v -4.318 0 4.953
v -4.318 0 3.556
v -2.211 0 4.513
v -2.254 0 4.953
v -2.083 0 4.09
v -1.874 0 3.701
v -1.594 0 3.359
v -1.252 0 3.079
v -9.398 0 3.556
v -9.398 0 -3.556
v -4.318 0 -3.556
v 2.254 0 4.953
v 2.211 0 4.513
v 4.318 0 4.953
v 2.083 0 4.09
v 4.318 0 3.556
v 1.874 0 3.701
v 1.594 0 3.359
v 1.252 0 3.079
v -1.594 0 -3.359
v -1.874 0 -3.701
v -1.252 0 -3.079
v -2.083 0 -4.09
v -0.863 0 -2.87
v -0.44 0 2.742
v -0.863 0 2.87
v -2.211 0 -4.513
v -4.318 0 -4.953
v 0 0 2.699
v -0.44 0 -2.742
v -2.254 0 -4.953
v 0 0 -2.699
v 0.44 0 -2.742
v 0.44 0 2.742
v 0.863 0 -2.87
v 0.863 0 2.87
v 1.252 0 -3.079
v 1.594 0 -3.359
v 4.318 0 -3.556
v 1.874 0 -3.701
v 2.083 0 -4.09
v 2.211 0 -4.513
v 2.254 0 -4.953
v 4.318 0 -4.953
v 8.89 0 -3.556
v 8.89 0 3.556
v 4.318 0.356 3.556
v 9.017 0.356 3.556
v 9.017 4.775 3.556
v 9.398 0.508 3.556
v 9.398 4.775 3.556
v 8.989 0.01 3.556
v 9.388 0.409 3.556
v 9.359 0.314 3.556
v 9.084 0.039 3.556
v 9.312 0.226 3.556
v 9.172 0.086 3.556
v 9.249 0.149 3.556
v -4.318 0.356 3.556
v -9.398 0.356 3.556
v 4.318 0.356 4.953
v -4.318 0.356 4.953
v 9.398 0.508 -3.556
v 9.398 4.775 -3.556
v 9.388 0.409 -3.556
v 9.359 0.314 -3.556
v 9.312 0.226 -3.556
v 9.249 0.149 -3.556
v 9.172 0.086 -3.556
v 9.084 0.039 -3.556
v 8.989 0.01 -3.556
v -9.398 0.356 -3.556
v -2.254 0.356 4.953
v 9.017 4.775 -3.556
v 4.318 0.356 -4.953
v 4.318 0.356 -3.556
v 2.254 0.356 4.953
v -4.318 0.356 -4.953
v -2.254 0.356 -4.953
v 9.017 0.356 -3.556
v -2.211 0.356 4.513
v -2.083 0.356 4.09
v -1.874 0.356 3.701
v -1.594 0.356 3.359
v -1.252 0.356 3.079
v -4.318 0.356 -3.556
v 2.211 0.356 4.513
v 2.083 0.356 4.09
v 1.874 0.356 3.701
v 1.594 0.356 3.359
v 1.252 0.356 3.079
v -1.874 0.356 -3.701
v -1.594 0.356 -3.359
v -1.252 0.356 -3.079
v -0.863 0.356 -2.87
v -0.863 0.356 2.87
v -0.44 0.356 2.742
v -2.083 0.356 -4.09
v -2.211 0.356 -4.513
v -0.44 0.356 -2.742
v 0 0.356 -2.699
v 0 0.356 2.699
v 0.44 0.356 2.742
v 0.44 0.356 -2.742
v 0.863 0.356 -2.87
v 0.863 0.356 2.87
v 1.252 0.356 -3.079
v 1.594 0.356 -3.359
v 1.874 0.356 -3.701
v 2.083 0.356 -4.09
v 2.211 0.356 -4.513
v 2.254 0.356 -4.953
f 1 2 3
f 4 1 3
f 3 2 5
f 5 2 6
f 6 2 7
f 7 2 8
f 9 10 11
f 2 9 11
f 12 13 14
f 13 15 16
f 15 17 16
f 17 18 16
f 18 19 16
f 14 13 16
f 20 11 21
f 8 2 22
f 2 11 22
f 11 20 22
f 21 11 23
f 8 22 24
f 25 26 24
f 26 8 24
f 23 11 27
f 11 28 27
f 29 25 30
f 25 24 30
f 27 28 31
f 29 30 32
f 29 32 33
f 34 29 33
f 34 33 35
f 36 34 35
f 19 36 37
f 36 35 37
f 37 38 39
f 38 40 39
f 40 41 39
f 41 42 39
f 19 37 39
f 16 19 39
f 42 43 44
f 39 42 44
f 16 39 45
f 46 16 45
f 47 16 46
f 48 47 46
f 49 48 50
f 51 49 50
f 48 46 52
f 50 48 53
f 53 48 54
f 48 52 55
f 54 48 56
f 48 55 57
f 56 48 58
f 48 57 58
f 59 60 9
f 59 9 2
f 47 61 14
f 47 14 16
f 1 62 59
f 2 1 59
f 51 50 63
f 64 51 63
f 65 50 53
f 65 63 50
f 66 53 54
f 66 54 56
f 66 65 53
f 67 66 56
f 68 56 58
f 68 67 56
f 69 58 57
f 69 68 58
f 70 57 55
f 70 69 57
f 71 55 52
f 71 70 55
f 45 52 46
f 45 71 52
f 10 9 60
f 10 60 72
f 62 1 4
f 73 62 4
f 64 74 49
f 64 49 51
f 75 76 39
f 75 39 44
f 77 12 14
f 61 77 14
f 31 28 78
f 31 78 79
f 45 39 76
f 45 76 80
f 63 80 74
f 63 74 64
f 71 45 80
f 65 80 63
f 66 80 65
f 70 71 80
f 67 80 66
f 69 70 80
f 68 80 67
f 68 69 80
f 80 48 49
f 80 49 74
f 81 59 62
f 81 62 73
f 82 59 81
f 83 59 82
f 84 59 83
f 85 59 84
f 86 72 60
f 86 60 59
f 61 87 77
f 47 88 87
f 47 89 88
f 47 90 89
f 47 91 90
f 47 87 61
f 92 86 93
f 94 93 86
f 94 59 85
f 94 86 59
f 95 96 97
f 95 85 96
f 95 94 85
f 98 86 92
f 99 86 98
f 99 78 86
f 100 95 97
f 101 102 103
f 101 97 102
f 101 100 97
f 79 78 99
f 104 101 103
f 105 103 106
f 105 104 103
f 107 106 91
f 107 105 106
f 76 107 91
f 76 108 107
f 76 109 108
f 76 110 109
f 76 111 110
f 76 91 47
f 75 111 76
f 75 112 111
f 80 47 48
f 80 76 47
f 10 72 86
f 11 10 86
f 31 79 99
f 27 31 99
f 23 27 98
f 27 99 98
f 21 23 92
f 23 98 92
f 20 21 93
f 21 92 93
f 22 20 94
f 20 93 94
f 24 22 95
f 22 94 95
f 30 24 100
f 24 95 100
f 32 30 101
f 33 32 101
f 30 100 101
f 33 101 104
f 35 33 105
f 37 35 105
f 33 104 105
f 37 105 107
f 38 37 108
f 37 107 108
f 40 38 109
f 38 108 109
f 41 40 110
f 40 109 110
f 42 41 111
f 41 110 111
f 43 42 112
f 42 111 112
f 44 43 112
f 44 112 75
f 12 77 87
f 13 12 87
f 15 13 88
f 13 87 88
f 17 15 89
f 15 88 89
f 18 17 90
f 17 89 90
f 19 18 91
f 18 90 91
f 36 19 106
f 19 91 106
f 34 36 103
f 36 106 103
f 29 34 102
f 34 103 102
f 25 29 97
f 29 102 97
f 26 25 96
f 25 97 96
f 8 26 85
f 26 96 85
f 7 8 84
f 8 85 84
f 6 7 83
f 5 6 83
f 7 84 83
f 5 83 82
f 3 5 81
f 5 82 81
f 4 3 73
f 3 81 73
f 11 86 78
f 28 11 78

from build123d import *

# Parameters (mm, degrees)
SKETCH1_W           = 18.796
SKETCH1_H           = 9.906
BOSS_EXTRUDE1_DEPTH = 0.3556
SKETCH2_R           = 2.25425
SKETCH2_W           = 5.08
SKETCH2_H           = 1.397
CUT_EXTRUDE1_DEPTH  = 11.629255118
SKETCH3_W           = 0.381
SKETCH3_H           = 7.112
BOSS_EXTRUDE2_DEPTH = 4.4196
FILLET2_R           = 0.508


with BuildPart() as part:
    # Sketch1 → Boss-Extrude1 (new body)
    with BuildSketch(Plane(origin=(0, 0, 0), x_dir=(1, 0, 0), z_dir=(0, 1, 0))):
        Rectangle(SKETCH1_W, SKETCH1_H)
    extrude(amount=BOSS_EXTRUDE1_DEPTH)

    # Sketch2 → Cut-Extrude1 (cut, through all)
    with BuildSketch(Plane(origin=(0, 0.3556, 0), x_dir=(1, 0, 0), z_dir=(0, 1, 0))):
        with Locations((0, 4.953)):
            Circle(SKETCH2_R)
        with Locations((0, -4.953)):
            Circle(SKETCH2_R)
        with Locations((-6.858, 4.2545)):
            Rectangle(SKETCH2_W, SKETCH2_H)
        with Locations((6.858, -4.2545)):
            Rectangle(SKETCH2_W, SKETCH2_H)
        with Locations((6.858, 4.2545)):
            Rectangle(SKETCH2_W, SKETCH2_H)
        with Locations((-6.858, -4.2545)):
            Rectangle(SKETCH2_W, SKETCH2_H)
    extrude(amount=-CUT_EXTRUDE1_DEPTH, mode=Mode.SUBTRACT)

    # Sketch3 → Boss-Extrude2 (add)
    with BuildSketch(Plane(origin=(0, 0.3556, 0), x_dir=(1, 0, 0), z_dir=(0, 1, 0))):
        with Locations((9.2075, 0)):
            Rectangle(SKETCH3_W, SKETCH3_H)
    extrude(amount=BOSS_EXTRUDE2_DEPTH)

    # Fillet2
    fillet2_edges = [part.edges().sort_by_distance(p)[0] for p in [
        (9.398, 0, 0),
    ]]
    fillet(fillet2_edges, radius=FILLET2_R)


solid = part.part
